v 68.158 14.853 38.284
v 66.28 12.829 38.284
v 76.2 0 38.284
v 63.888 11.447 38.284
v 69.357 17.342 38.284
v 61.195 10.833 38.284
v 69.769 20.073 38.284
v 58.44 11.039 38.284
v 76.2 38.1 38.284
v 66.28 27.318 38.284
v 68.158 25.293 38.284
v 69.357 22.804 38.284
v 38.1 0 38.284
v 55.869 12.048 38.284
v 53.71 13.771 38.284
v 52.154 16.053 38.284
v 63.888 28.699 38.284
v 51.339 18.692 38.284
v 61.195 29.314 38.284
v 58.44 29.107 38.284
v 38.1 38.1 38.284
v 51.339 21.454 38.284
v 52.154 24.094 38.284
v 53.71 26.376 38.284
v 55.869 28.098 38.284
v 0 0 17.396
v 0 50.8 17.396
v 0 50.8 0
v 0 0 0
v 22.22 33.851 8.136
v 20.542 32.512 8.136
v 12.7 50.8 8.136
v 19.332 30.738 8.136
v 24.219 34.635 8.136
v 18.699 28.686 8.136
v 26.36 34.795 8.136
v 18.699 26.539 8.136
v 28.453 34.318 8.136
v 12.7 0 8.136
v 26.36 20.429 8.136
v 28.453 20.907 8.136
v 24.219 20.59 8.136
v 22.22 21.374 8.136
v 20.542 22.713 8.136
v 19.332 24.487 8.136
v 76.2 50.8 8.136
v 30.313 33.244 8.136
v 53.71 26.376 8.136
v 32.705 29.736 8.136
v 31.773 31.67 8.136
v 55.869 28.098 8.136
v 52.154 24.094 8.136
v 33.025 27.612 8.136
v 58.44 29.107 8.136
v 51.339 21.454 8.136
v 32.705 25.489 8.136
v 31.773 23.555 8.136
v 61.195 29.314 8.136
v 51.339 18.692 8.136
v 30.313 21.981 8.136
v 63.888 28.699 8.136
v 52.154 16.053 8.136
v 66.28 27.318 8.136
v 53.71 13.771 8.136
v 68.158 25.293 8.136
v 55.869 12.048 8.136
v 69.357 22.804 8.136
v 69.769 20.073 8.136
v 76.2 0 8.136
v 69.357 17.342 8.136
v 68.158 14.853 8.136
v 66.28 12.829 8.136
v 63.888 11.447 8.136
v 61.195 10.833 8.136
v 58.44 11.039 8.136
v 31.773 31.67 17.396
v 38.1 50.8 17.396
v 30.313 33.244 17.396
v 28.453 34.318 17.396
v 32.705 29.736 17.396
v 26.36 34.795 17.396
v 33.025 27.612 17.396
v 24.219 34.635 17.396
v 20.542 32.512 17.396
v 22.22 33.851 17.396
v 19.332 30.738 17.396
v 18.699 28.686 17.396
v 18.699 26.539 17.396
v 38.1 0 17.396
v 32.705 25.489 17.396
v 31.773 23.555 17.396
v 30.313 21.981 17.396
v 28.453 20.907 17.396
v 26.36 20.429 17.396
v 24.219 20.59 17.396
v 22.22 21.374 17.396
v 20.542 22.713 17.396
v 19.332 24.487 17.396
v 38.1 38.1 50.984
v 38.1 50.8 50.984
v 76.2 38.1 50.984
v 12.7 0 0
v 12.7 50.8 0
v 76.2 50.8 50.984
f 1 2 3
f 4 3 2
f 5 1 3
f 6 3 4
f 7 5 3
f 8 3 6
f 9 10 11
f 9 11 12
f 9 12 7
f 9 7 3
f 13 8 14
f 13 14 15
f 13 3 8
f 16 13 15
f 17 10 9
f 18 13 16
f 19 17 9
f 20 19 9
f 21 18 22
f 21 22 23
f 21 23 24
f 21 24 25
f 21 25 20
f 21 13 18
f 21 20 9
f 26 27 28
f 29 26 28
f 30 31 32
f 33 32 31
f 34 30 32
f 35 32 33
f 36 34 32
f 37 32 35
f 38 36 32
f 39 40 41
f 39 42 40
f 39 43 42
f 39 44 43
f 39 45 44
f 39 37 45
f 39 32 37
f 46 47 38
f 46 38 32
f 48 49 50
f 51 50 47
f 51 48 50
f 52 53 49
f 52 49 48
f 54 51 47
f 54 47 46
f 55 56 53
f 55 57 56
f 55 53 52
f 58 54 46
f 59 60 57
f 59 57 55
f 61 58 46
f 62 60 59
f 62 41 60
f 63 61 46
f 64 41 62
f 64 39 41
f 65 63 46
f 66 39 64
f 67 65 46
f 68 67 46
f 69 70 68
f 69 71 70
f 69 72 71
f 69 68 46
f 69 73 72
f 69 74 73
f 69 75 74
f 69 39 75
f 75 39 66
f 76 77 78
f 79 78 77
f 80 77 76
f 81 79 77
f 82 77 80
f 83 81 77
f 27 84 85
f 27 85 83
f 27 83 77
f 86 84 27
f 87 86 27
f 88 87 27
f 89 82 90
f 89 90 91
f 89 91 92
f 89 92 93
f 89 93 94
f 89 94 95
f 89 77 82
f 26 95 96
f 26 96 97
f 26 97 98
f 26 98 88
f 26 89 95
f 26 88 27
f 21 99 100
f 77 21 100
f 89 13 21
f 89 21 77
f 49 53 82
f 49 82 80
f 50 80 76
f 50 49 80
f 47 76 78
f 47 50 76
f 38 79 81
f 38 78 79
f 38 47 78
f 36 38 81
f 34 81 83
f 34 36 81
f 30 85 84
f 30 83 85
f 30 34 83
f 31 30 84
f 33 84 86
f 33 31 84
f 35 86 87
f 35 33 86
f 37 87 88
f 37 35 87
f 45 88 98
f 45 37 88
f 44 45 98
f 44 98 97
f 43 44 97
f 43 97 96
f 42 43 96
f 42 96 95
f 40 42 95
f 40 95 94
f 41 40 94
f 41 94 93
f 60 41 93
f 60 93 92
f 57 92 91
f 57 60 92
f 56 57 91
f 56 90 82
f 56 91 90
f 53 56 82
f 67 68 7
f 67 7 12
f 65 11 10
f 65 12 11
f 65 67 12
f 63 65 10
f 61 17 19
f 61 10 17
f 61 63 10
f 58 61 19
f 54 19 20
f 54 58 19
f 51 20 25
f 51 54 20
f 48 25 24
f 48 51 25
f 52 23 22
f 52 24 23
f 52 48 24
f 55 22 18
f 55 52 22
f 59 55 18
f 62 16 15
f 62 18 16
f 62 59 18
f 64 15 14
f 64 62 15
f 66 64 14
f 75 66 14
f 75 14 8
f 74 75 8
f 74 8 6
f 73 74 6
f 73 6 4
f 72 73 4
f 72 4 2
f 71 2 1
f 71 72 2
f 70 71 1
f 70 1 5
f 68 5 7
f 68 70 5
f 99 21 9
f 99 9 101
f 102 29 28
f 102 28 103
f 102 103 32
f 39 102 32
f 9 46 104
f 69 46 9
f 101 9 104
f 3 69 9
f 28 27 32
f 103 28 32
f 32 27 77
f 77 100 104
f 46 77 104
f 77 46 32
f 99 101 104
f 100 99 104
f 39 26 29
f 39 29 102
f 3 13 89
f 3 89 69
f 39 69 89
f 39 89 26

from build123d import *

# Parameters (mm, degrees)
F2_DEPTH = 50.8
F1_R     = 7.203181
F1_R_2   = 9.266269
F3_DEPTH = 88.9
F4_W     = 12.7
F4_H     = 12.7
F5_DEPTH = 38.1
F7_DEPTH = 76.2


with BuildPart() as f2:
    # F0 (on Front) → F2 (new body)
    with BuildSketch(Plane.XZ):
        Polygon((0, 0), (12.7, 0), (12.7, 8.135938), (76.2, 8.135938), (76.2, 50.983995), (38.1, 50.8), (38.1, 17.396355), (0, 17.396355), align=None)
    extrude(amount=-F2_DEPTH)

    # F1 (on Top) → F3 (cut)
    with BuildSketch(Plane.XY):
        with Locations((25.821837, 27.612405)):
            Circle(F1_R)
        with Locations((60.502268, 20.073181)):
            Circle(F1_R_2)
    extrude(amount=F3_DEPTH, mode=Mode.SUBTRACT)

    # F4 (on face) → F5 (join)
    with BuildSketch(Plane.YZ.offset(76.2)):
        with Locations((44.45, 44.633995)):
            Rectangle(F4_W, F4_H)
    extrude(amount=-F5_DEPTH)

    # F6 (on Right) → F7 (cut)
    with BuildSketch(Plane.YZ):
        Polygon((38.1, 51.342876), (0, 50.983995), (0, 38.283995), (38.1, 38.283995), align=None)
    extrude(amount=F7_DEPTH, mode=Mode.SUBTRACT)


solid = f2.part
